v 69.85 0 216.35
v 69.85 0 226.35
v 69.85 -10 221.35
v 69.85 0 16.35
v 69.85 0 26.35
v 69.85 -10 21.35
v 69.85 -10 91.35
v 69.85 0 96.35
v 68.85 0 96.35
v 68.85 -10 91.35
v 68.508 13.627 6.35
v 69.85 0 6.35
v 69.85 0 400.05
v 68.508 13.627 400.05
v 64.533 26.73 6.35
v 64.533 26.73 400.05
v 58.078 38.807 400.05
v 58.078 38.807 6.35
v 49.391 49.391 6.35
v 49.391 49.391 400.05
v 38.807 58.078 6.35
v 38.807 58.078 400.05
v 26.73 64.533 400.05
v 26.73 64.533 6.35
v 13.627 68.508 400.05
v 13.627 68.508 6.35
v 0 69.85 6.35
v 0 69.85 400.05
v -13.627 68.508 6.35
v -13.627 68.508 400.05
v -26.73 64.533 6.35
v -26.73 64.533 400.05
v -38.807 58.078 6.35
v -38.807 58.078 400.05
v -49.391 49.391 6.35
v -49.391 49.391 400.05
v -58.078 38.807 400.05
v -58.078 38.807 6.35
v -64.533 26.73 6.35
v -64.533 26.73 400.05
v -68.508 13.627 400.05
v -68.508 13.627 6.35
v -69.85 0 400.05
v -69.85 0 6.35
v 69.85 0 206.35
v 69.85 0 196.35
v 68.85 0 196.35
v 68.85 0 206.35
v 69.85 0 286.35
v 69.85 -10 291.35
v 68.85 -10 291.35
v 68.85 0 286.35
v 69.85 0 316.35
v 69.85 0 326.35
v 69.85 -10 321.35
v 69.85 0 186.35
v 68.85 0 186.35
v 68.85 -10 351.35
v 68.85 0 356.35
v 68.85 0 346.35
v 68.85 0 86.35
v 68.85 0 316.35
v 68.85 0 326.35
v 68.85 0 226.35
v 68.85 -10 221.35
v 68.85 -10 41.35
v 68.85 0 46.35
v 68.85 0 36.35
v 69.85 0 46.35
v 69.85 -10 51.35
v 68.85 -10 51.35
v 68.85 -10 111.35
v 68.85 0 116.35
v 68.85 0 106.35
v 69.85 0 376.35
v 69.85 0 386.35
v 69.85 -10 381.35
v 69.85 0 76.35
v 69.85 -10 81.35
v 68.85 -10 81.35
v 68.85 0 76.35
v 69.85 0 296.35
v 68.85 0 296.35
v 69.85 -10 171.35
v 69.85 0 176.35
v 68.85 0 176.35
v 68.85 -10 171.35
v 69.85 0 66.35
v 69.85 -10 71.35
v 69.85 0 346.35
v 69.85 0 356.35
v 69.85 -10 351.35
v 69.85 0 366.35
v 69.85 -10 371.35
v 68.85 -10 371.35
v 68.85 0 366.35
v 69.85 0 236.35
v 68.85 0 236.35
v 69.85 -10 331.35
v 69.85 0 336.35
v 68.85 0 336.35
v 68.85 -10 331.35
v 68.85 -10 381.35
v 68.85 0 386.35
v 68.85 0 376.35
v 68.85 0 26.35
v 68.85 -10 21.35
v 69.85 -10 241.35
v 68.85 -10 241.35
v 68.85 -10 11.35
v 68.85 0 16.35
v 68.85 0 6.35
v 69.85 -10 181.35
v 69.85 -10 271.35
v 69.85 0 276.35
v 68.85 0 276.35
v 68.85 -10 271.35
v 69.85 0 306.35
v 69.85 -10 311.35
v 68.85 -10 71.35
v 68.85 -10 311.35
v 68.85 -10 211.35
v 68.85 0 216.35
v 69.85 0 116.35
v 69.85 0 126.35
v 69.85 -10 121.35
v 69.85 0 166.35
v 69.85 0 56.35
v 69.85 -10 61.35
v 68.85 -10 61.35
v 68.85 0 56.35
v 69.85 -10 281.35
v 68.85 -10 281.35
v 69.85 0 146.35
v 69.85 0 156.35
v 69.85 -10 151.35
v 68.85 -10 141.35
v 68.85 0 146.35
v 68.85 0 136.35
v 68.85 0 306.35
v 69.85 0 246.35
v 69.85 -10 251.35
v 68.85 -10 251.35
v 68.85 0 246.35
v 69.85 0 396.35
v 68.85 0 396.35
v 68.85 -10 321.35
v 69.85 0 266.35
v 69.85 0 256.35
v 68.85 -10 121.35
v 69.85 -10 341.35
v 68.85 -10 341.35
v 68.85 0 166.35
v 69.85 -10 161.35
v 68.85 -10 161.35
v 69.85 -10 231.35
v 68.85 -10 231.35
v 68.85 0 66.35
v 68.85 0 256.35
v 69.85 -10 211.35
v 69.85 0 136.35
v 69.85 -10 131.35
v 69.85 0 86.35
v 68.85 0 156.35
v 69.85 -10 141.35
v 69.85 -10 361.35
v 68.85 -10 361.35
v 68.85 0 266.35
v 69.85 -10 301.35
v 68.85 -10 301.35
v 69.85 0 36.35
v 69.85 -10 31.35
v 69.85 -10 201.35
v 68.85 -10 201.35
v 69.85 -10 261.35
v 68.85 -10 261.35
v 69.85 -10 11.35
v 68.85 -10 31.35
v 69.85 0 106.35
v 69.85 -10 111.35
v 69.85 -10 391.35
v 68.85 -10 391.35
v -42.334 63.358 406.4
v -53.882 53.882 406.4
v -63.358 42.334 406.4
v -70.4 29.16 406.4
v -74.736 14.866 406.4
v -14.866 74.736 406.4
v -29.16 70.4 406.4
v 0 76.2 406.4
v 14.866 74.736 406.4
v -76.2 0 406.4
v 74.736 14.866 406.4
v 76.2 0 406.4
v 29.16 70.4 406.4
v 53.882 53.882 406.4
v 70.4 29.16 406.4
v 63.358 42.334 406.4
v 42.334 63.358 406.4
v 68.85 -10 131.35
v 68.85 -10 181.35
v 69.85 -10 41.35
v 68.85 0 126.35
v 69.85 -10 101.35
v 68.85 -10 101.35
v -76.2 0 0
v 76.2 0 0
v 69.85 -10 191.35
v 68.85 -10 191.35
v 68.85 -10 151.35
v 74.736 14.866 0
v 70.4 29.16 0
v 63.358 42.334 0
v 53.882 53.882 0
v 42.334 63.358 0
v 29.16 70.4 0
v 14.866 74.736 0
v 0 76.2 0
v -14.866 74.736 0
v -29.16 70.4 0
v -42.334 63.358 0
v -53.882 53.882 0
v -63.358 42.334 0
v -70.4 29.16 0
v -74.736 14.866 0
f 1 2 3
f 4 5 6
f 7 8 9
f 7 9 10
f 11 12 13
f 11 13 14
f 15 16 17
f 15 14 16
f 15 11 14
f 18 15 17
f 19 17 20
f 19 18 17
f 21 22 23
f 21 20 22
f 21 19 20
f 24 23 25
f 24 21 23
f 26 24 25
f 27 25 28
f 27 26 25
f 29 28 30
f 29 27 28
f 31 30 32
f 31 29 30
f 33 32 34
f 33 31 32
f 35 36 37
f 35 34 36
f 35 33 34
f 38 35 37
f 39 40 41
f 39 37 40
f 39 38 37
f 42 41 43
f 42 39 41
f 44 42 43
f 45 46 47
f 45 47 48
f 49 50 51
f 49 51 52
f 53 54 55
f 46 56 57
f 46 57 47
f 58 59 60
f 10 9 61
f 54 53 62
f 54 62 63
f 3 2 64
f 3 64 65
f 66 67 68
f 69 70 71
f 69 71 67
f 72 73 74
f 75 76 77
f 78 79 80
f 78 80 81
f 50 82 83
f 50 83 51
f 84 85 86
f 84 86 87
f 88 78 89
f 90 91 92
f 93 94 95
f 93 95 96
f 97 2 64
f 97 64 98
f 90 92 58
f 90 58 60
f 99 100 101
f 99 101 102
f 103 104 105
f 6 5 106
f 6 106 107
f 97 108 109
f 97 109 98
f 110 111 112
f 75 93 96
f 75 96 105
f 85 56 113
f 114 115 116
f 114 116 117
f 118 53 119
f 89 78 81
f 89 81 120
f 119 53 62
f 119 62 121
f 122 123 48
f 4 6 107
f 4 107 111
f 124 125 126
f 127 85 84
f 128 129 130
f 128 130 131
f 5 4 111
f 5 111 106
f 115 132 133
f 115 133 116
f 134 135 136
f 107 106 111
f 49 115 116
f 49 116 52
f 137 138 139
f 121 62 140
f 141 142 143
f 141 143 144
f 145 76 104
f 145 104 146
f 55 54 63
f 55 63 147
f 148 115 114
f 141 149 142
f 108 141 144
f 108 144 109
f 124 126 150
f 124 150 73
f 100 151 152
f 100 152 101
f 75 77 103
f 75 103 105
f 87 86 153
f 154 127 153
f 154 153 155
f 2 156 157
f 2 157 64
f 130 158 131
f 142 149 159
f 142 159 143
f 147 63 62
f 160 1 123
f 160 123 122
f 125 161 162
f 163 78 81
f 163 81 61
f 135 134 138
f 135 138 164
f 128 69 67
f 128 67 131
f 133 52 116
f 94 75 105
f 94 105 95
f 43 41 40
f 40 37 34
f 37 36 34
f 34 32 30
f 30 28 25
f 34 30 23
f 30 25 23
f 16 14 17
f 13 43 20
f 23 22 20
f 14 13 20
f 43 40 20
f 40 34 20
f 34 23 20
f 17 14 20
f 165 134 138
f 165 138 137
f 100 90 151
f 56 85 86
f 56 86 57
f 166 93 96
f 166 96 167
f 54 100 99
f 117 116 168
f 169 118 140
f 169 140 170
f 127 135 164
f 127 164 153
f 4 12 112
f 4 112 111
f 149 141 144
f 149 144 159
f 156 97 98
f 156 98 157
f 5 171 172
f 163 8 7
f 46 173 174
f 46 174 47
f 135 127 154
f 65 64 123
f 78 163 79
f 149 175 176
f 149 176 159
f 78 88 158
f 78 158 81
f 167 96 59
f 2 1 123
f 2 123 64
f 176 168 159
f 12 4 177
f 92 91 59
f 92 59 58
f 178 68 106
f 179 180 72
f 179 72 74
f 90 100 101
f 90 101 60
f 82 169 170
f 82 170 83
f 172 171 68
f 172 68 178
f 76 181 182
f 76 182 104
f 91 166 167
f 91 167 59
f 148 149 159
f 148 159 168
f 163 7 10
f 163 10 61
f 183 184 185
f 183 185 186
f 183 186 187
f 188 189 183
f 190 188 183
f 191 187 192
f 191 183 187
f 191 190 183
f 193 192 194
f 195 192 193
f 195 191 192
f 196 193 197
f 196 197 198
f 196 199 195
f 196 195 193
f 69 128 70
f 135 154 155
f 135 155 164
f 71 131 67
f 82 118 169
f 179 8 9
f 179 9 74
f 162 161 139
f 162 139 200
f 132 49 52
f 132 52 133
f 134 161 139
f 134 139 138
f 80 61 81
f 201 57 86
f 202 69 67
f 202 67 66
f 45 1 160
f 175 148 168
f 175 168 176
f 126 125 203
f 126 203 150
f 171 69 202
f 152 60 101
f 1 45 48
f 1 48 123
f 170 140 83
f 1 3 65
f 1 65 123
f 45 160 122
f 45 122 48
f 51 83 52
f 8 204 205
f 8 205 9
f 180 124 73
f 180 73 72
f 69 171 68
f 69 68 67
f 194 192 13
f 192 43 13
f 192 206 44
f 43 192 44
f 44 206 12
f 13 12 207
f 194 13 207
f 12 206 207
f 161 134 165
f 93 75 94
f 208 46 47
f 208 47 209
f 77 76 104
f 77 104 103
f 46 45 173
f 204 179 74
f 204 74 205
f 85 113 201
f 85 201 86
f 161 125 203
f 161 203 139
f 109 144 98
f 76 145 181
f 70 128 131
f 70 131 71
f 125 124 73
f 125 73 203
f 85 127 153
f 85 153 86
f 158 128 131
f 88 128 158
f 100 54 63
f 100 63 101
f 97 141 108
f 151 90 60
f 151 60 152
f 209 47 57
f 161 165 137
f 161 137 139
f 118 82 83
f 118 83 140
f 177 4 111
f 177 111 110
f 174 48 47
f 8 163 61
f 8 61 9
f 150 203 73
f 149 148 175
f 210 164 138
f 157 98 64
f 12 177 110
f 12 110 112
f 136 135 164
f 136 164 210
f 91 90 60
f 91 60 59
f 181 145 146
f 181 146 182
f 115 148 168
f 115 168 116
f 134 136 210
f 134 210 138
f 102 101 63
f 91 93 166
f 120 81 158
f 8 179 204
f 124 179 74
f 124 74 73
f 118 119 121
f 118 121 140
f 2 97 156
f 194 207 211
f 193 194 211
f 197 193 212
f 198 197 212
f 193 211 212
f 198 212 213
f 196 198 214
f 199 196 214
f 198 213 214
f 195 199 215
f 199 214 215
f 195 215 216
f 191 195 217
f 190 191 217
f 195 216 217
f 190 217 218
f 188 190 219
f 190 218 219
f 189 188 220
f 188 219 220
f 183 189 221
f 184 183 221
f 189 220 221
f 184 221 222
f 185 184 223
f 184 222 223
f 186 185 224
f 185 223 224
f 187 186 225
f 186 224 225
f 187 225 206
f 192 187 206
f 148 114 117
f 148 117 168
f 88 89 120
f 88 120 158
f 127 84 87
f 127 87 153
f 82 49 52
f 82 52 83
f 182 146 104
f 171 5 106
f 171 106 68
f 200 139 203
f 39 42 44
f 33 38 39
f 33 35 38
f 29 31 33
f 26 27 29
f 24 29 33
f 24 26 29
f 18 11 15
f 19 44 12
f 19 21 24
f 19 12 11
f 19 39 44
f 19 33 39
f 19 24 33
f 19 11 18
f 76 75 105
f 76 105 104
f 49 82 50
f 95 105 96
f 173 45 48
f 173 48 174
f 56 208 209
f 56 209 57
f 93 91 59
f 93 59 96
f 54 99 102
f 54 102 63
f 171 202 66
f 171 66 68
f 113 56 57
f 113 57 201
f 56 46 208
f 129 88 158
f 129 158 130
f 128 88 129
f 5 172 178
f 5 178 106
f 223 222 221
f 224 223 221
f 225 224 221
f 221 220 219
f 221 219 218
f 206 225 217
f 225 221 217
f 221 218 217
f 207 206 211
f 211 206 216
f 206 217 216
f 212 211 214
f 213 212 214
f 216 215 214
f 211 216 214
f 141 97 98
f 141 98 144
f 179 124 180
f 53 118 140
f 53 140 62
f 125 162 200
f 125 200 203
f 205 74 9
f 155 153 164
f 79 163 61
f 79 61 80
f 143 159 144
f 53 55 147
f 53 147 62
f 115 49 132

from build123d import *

# Parameters (mm, degrees)
BOSS_EXTRUDE1_DEPTH    = 406.4
SHELL1_T               = -6.35
BOSS_EXTRUDE2_DEPTH    = 1
BOSS_EXTRUDE2_2_DEPTH  = 1
BOSS_EXTRUDE2_3_DEPTH  = 1
BOSS_EXTRUDE2_4_DEPTH  = 1
BOSS_EXTRUDE2_5_DEPTH  = 1
BOSS_EXTRUDE2_6_DEPTH  = 1
BOSS_EXTRUDE2_7_DEPTH  = 1
BOSS_EXTRUDE2_8_DEPTH  = 1
BOSS_EXTRUDE2_9_DEPTH  = 1
BOSS_EXTRUDE2_10_DEPTH = 1
BOSS_EXTRUDE2_11_DEPTH = 1
BOSS_EXTRUDE2_12_DEPTH = 1
BOSS_EXTRUDE2_13_DEPTH = 1
BOSS_EXTRUDE2_14_DEPTH = 1
BOSS_EXTRUDE2_15_DEPTH = 1
BOSS_EXTRUDE2_16_DEPTH = 1
BOSS_EXTRUDE2_17_DEPTH = 1
BOSS_EXTRUDE2_18_DEPTH = 1
BOSS_EXTRUDE2_19_DEPTH = 1
BOSS_EXTRUDE2_20_DEPTH = 1
BOSS_EXTRUDE2_21_DEPTH = 1
BOSS_EXTRUDE2_22_DEPTH = 1
BOSS_EXTRUDE2_23_DEPTH = 1
BOSS_EXTRUDE2_24_DEPTH = 1
BOSS_EXTRUDE2_25_DEPTH = 1
BOSS_EXTRUDE2_26_DEPTH = 1
BOSS_EXTRUDE2_27_DEPTH = 1
BOSS_EXTRUDE2_28_DEPTH = 1
BOSS_EXTRUDE2_29_DEPTH = 1
BOSS_EXTRUDE2_30_DEPTH = 1
BOSS_EXTRUDE2_31_DEPTH = 1
BOSS_EXTRUDE2_32_DEPTH = 1
BOSS_EXTRUDE2_33_DEPTH = 1
BOSS_EXTRUDE2_34_DEPTH = 1
BOSS_EXTRUDE2_35_DEPTH = 1
BOSS_EXTRUDE2_36_DEPTH = 1
BOSS_EXTRUDE2_37_DEPTH = 1
BOSS_EXTRUDE2_38_DEPTH = 1
BOSS_EXTRUDE2_39_DEPTH = 1


with BuildPart() as part:
    # Sketch1 → Boss-Extrude1 (new body)
    with BuildSketch(Plane.XY):
        with BuildLine():
            Line((-76.2, 0), (76.2, 0))
            ThreePointArc((76.2, 0), (0, 76.2), (-76.2, 0))
        make_face()
    extrude(amount=BOSS_EXTRUDE1_DEPTH)

    # Shell1
    shell1_openings = [part.faces().sort_by_distance(p)[0] for p in [
        (0, 0, 203.2),
    ]]
    offset(amount=SHELL1_T, openings=shell1_openings)


with BuildPart() as body_2:
    # Sketch3 → Boss-Extrude2 (new body)
    with BuildSketch(Plane(origin=(69.85, 0, 0), x_dir=(0, 0, -1), z_dir=(1, 0, 0))):
        Polygon((-11.35, -10), (-6.35, 0), (-16.35, 0), align=None)
    extrude(amount=-BOSS_EXTRUDE2_DEPTH)


with BuildPart() as body_3:
    # Sketch3 → Boss-Extrude2 2 (new body)
    with BuildSketch(Plane(origin=(69.85, 0, 0), x_dir=(0, 0, -1), z_dir=(1, 0, 0))):
        Polygon((-21.35, -10), (-16.35, 0), (-26.35, 0), align=None)
    extrude(amount=-BOSS_EXTRUDE2_2_DEPTH)


with BuildPart() as body_4:
    # Sketch3 → Boss-Extrude2 3 (new body)
    with BuildSketch(Plane(origin=(69.85, 0, 0), x_dir=(0, 0, -1), z_dir=(1, 0, 0))):
        Polygon((-31.35, -10), (-26.35, 0), (-36.35, 0), align=None)
    extrude(amount=-BOSS_EXTRUDE2_3_DEPTH)


with BuildPart() as body_5:
    # Sketch3 → Boss-Extrude2 4 (new body)
    with BuildSketch(Plane(origin=(69.85, 0, 0), x_dir=(0, 0, -1), z_dir=(1, 0, 0))):
        Polygon((-41.35, -10), (-36.35, 0), (-46.35, 0), align=None)
    extrude(amount=-BOSS_EXTRUDE2_4_DEPTH)


with BuildPart() as body_6:
    # Sketch3 → Boss-Extrude2 5 (new body)
    with BuildSketch(Plane(origin=(69.85, 0, 0), x_dir=(0, 0, -1), z_dir=(1, 0, 0))):
        Polygon((-51.35, -10), (-46.35, 0), (-56.35, 0), align=None)
    extrude(amount=-BOSS_EXTRUDE2_5_DEPTH)


with BuildPart() as body_7:
    # Sketch3 → Boss-Extrude2 6 (new body)
    with BuildSketch(Plane(origin=(69.85, 0, 0), x_dir=(0, 0, -1), z_dir=(1, 0, 0))):
        Polygon((-61.35, -10), (-56.35, 0), (-66.35, 0), align=None)
    extrude(amount=-BOSS_EXTRUDE2_6_DEPTH)


with BuildPart() as body_8:
    # Sketch3 → Boss-Extrude2 7 (new body)
    with BuildSketch(Plane(origin=(69.85, 0, 0), x_dir=(0, 0, -1), z_dir=(1, 0, 0))):
        Polygon((-71.35, -10), (-66.35, 0), (-76.35, 0), align=None)
    extrude(amount=-BOSS_EXTRUDE2_7_DEPTH)


with BuildPart() as body_9:
    # Sketch3 → Boss-Extrude2 8 (new body)
    with BuildSketch(Plane(origin=(69.85, 0, 0), x_dir=(0, 0, -1), z_dir=(1, 0, 0))):
        Polygon((-81.35, -10), (-76.35, 0), (-86.35, 0), align=None)
    extrude(amount=-BOSS_EXTRUDE2_8_DEPTH)


with BuildPart() as body_10:
    # Sketch3 → Boss-Extrude2 9 (new body)
    with BuildSketch(Plane(origin=(69.85, 0, 0), x_dir=(0, 0, -1), z_dir=(1, 0, 0))):
        Polygon((-91.35, -10), (-86.35, 0), (-96.35, 0), align=None)
    extrude(amount=-BOSS_EXTRUDE2_9_DEPTH)


with BuildPart() as body_11:
    # Sketch3 → Boss-Extrude2 10 (new body)
    with BuildSketch(Plane(origin=(69.85, 0, 0), x_dir=(0, 0, -1), z_dir=(1, 0, 0))):
        Polygon((-101.35, -10), (-96.35, 0), (-106.35, 0), align=None)
    extrude(amount=-BOSS_EXTRUDE2_10_DEPTH)


with BuildPart() as body_12:
    # Sketch3 → Boss-Extrude2 11 (new body)
    with BuildSketch(Plane(origin=(69.85, 0, 0), x_dir=(0, 0, -1), z_dir=(1, 0, 0))):
        Polygon((-111.35, -10), (-106.35, 0), (-116.35, 0), align=None)
    extrude(amount=-BOSS_EXTRUDE2_11_DEPTH)


with BuildPart() as body_13:
    # Sketch3 → Boss-Extrude2 12 (new body)
    with BuildSketch(Plane(origin=(69.85, 0, 0), x_dir=(0, 0, -1), z_dir=(1, 0, 0))):
        Polygon((-121.35, -10), (-116.35, 0), (-126.35, 0), align=None)
    extrude(amount=-BOSS_EXTRUDE2_12_DEPTH)


with BuildPart() as body_14:
    # Sketch3 → Boss-Extrude2 13 (new body)
    with BuildSketch(Plane(origin=(69.85, 0, 0), x_dir=(0, 0, -1), z_dir=(1, 0, 0))):
        Polygon((-131.35, -10), (-126.35, 0), (-136.35, 0), align=None)
    extrude(amount=-BOSS_EXTRUDE2_13_DEPTH)


with BuildPart() as body_15:
    # Sketch3 → Boss-Extrude2 14 (new body)
    with BuildSketch(Plane(origin=(69.85, 0, 0), x_dir=(0, 0, -1), z_dir=(1, 0, 0))):
        Polygon((-141.35, -10), (-136.35, 0), (-146.35, 0), align=None)
    extrude(amount=-BOSS_EXTRUDE2_14_DEPTH)


with BuildPart() as body_16:
    # Sketch3 → Boss-Extrude2 15 (new body)
    with BuildSketch(Plane(origin=(69.85, 0, 0), x_dir=(0, 0, -1), z_dir=(1, 0, 0))):
        Polygon((-151.35, -10), (-146.35, 0), (-156.35, 0), align=None)
    extrude(amount=-BOSS_EXTRUDE2_15_DEPTH)


with BuildPart() as body_17:
    # Sketch3 → Boss-Extrude2 16 (new body)
    with BuildSketch(Plane(origin=(69.85, 0, 0), x_dir=(0, 0, -1), z_dir=(1, 0, 0))):
        Polygon((-161.35, -10), (-156.35, 0), (-166.35, 0), align=None)
    extrude(amount=-BOSS_EXTRUDE2_16_DEPTH)


with BuildPart() as body_18:
    # Sketch3 → Boss-Extrude2 17 (new body)
    with BuildSketch(Plane(origin=(69.85, 0, 0), x_dir=(0, 0, -1), z_dir=(1, 0, 0))):
        Polygon((-171.35, -10), (-166.35, 0), (-176.35, 0), align=None)
    extrude(amount=-BOSS_EXTRUDE2_17_DEPTH)


with BuildPart() as body_19:
    # Sketch3 → Boss-Extrude2 18 (new body)
    with BuildSketch(Plane(origin=(69.85, 0, 0), x_dir=(0, 0, -1), z_dir=(1, 0, 0))):
        Polygon((-181.35, -10), (-176.35, 0), (-186.35, 0), align=None)
    extrude(amount=-BOSS_EXTRUDE2_18_DEPTH)


with BuildPart() as body_20:
    # Sketch3 → Boss-Extrude2 19 (new body)
    with BuildSketch(Plane(origin=(69.85, 0, 0), x_dir=(0, 0, -1), z_dir=(1, 0, 0))):
        Polygon((-191.35, -10), (-186.35, 0), (-196.35, 0), align=None)
    extrude(amount=-BOSS_EXTRUDE2_19_DEPTH)


with BuildPart() as body_21:
    # Sketch3 → Boss-Extrude2 20 (new body)
    with BuildSketch(Plane(origin=(69.85, 0, 0), x_dir=(0, 0, -1), z_dir=(1, 0, 0))):
        Polygon((-201.35, -10), (-196.35, 0), (-206.35, 0), align=None)
    extrude(amount=-BOSS_EXTRUDE2_20_DEPTH)


with BuildPart() as body_22:
    # Sketch3 → Boss-Extrude2 21 (new body)
    with BuildSketch(Plane(origin=(69.85, 0, 0), x_dir=(0, 0, -1), z_dir=(1, 0, 0))):
        Polygon((-211.35, -10), (-206.35, 0), (-216.35, 0), align=None)
    extrude(amount=-BOSS_EXTRUDE2_21_DEPTH)


with BuildPart() as body_23:
    # Sketch3 → Boss-Extrude2 22 (new body)
    with BuildSketch(Plane(origin=(69.85, 0, 0), x_dir=(0, 0, -1), z_dir=(1, 0, 0))):
        Polygon((-221.35, -10), (-216.35, 0), (-226.35, 0), align=None)
    extrude(amount=-BOSS_EXTRUDE2_22_DEPTH)


with BuildPart() as body_24:
    # Sketch3 → Boss-Extrude2 23 (new body)
    with BuildSketch(Plane(origin=(69.85, 0, 0), x_dir=(0, 0, -1), z_dir=(1, 0, 0))):
        Polygon((-231.35, -10), (-226.35, 0), (-236.35, 0), align=None)
    extrude(amount=-BOSS_EXTRUDE2_23_DEPTH)


with BuildPart() as body_25:
    # Sketch3 → Boss-Extrude2 24 (new body)
    with BuildSketch(Plane(origin=(69.85, 0, 0), x_dir=(0, 0, -1), z_dir=(1, 0, 0))):
        Polygon((-241.35, -10), (-236.35, 0), (-246.35, 0), align=None)
    extrude(amount=-BOSS_EXTRUDE2_24_DEPTH)


with BuildPart() as body_26:
    # Sketch3 → Boss-Extrude2 25 (new body)
    with BuildSketch(Plane(origin=(69.85, 0, 0), x_dir=(0, 0, -1), z_dir=(1, 0, 0))):
        Polygon((-251.35, -10), (-246.35, 0), (-256.35, 0), align=None)
    extrude(amount=-BOSS_EXTRUDE2_25_DEPTH)


with BuildPart() as body_27:
    # Sketch3 → Boss-Extrude2 26 (new body)
    with BuildSketch(Plane(origin=(69.85, 0, 0), x_dir=(0, 0, -1), z_dir=(1, 0, 0))):
        Polygon((-261.35, -10), (-256.35, 0), (-266.35, 0), align=None)
    extrude(amount=-BOSS_EXTRUDE2_26_DEPTH)


with BuildPart() as body_28:
    # Sketch3 → Boss-Extrude2 27 (new body)
    with BuildSketch(Plane(origin=(69.85, 0, 0), x_dir=(0, 0, -1), z_dir=(1, 0, 0))):
        Polygon((-271.35, -10), (-266.35, 0), (-276.35, 0), align=None)
    extrude(amount=-BOSS_EXTRUDE2_27_DEPTH)


with BuildPart() as body_29:
    # Sketch3 → Boss-Extrude2 28 (new body)
    with BuildSketch(Plane(origin=(69.85, 0, 0), x_dir=(0, 0, -1), z_dir=(1, 0, 0))):
        Polygon((-281.35, -10), (-276.35, 0), (-286.35, 0), align=None)
    extrude(amount=-BOSS_EXTRUDE2_28_DEPTH)


with BuildPart() as body_30:
    # Sketch3 → Boss-Extrude2 29 (new body)
    with BuildSketch(Plane(origin=(69.85, 0, 0), x_dir=(0, 0, -1), z_dir=(1, 0, 0))):
        Polygon((-291.35, -10), (-286.35, 0), (-296.35, 0), align=None)
    extrude(amount=-BOSS_EXTRUDE2_29_DEPTH)


with BuildPart() as body_31:
    # Sketch3 → Boss-Extrude2 30 (new body)
    with BuildSketch(Plane(origin=(69.85, 0, 0), x_dir=(0, 0, -1), z_dir=(1, 0, 0))):
        Polygon((-301.35, -10), (-296.35, 0), (-306.35, 0), align=None)
    extrude(amount=-BOSS_EXTRUDE2_30_DEPTH)


with BuildPart() as body_32:
    # Sketch3 → Boss-Extrude2 31 (new body)
    with BuildSketch(Plane(origin=(69.85, 0, 0), x_dir=(0, 0, -1), z_dir=(1, 0, 0))):
        Polygon((-311.35, -10), (-306.35, 0), (-316.35, 0), align=None)
    extrude(amount=-BOSS_EXTRUDE2_31_DEPTH)


with BuildPart() as body_33:
    # Sketch3 → Boss-Extrude2 32 (new body)
    with BuildSketch(Plane(origin=(69.85, 0, 0), x_dir=(0, 0, -1), z_dir=(1, 0, 0))):
        Polygon((-321.35, -10), (-316.35, 0), (-326.35, 0), align=None)
    extrude(amount=-BOSS_EXTRUDE2_32_DEPTH)


with BuildPart() as body_34:
    # Sketch3 → Boss-Extrude2 33 (new body)
    with BuildSketch(Plane(origin=(69.85, 0, 0), x_dir=(0, 0, -1), z_dir=(1, 0, 0))):
        Polygon((-331.35, -10), (-326.35, 0), (-336.35, 0), align=None)
    extrude(amount=-BOSS_EXTRUDE2_33_DEPTH)


with BuildPart() as body_35:
    # Sketch3 → Boss-Extrude2 34 (new body)
    with BuildSketch(Plane(origin=(69.85, 0, 0), x_dir=(0, 0, -1), z_dir=(1, 0, 0))):
        Polygon((-391.35, -10), (-386.35, 0), (-396.35, 0), align=None)
    extrude(amount=-BOSS_EXTRUDE2_34_DEPTH)


with BuildPart() as body_36:
    # Sketch3 → Boss-Extrude2 35 (new body)
    with BuildSketch(Plane(origin=(69.85, 0, 0), x_dir=(0, 0, -1), z_dir=(1, 0, 0))):
        Polygon((-381.35, -10), (-376.35, 0), (-386.35, 0), align=None)
    extrude(amount=-BOSS_EXTRUDE2_35_DEPTH)


with BuildPart() as body_37:
    # Sketch3 → Boss-Extrude2 36 (new body)
    with BuildSketch(Plane(origin=(69.85, 0, 0), x_dir=(0, 0, -1), z_dir=(1, 0, 0))):
        Polygon((-371.35, -10), (-366.35, 0), (-376.35, 0), align=None)
    extrude(amount=-BOSS_EXTRUDE2_36_DEPTH)


with BuildPart() as body_38:
    # Sketch3 → Boss-Extrude2 37 (new body)
    with BuildSketch(Plane(origin=(69.85, 0, 0), x_dir=(0, 0, -1), z_dir=(1, 0, 0))):
        Polygon((-361.35, -10), (-356.35, 0), (-366.35, 0), align=None)
    extrude(amount=-BOSS_EXTRUDE2_37_DEPTH)


with BuildPart() as body_39:
    # Sketch3 → Boss-Extrude2 38 (new body)
    with BuildSketch(Plane(origin=(69.85, 0, 0), x_dir=(0, 0, -1), z_dir=(1, 0, 0))):
        Polygon((-351.35, -10), (-346.35, 0), (-356.35, 0), align=None)
    extrude(amount=-BOSS_EXTRUDE2_38_DEPTH)


with BuildPart() as body_40:
    # Sketch3 → Boss-Extrude2 39 (new body)
    with BuildSketch(Plane(origin=(69.85, 0, 0), x_dir=(0, 0, -1), z_dir=(1, 0, 0))):
        Polygon((-341.35, -10), (-336.35, 0), (-346.35, 0), align=None)
    extrude(amount=-BOSS_EXTRUDE2_39_DEPTH)


solid = Compound([part.part, body_2.part, body_3.part, body_4.part, body_5.part, body_6.part, body_7.part, body_8.part, body_9.part, body_10.part, body_11.part, body_12.part, body_13.part, body_14.part, body_15.part, body_16.part, body_17.part, body_18.part, body_19.part, body_20.part, body_21.part, body_22.part, body_23.part, body_24.part, body_25.part, body_26.part, body_27.part, body_28.part, body_29.part, body_30.part, body_31.part, body_32.part, body_33.part, body_34.part, body_35.part, body_36.part, body_37.part, body_38.part, body_39.part, body_40.part])
